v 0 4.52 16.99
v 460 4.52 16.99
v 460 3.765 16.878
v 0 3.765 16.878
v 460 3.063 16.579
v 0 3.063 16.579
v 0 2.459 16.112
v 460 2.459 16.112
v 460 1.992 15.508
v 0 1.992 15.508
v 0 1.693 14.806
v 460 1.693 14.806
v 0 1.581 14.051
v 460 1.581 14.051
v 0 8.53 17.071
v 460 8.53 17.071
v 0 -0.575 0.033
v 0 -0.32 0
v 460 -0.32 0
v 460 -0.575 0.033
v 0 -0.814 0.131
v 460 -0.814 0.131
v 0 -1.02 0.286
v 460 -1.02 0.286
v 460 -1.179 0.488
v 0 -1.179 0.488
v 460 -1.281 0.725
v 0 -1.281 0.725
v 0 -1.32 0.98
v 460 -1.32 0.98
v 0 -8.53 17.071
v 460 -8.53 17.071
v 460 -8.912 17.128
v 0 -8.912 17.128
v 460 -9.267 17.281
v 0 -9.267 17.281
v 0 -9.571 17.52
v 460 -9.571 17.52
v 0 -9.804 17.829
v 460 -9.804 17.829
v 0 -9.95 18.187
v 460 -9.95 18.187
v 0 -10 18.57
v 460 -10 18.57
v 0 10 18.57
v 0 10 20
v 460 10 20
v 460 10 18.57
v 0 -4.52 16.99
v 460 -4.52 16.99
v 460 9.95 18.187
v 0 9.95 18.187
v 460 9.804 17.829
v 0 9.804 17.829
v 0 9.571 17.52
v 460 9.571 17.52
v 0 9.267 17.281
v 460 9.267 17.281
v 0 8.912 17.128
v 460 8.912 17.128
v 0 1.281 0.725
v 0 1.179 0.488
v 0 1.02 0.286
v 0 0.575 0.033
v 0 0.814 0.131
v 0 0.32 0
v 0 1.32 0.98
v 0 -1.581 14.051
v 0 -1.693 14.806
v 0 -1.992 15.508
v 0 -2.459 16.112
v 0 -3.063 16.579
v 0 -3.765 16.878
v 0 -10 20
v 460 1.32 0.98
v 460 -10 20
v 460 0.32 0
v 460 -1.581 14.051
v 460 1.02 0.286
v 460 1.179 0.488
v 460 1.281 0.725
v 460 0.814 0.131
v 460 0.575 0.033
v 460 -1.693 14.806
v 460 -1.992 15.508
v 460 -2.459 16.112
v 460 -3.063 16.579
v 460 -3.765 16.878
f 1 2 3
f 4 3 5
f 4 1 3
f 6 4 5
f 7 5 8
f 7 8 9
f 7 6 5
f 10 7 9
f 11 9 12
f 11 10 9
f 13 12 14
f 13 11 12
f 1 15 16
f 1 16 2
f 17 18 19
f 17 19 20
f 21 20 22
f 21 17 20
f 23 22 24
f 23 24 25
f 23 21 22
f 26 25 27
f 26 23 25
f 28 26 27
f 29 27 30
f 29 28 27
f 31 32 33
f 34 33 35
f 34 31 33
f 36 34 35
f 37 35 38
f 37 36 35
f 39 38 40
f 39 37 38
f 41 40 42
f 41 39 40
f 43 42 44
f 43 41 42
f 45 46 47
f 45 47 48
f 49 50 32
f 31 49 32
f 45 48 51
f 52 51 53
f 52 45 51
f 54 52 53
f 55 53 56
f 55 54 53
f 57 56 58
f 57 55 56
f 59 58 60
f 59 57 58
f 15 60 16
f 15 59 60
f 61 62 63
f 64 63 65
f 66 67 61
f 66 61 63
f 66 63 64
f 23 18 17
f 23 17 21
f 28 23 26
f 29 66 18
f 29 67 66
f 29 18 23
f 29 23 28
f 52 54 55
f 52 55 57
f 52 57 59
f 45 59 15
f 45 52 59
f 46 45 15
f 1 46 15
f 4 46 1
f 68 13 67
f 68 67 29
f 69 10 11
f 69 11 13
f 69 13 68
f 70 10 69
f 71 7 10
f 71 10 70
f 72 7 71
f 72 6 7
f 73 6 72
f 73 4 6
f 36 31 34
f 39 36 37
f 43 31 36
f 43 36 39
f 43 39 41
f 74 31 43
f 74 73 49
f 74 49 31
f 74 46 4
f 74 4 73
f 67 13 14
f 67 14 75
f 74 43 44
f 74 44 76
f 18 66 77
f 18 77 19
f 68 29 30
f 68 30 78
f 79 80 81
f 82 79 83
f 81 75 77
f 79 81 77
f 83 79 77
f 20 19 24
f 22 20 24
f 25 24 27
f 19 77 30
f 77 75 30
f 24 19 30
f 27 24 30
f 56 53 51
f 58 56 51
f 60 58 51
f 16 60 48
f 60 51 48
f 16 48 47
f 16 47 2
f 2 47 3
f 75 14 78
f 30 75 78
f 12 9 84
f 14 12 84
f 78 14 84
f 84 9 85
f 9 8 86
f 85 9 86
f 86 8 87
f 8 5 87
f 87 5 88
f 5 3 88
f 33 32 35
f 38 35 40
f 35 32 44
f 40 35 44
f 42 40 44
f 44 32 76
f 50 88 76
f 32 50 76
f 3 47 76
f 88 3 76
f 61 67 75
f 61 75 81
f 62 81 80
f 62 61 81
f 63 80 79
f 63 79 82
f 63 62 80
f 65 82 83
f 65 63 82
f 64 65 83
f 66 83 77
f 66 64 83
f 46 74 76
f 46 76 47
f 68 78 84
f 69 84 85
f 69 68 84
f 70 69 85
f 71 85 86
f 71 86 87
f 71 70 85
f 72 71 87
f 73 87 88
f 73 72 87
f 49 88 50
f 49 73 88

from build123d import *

# Parameters (mm, degrees)
T_SECTION_T_20_X_20_1_DEPTH = 460


with BuildPart() as part:
    # Sketch12 → T section T 20 X 20(1) (new body)
    with BuildSketch(Plane.YZ):
        with BuildLine():
            Line((-10, 20), (10, 20))
            Line((10, 20), (10, 18.570314587))
            ThreePointArc((10, 18.570314587), (9.571214338, 17.520314662), (8.530000209, 17.070614622))
            Line((8.530000209, 17.070614622), (4.520436432, 16.990406743))
            ThreePointArc((4.520436432, 16.990406743), (2.459116507, 16.112327155), (1.581036919, 14.05100723))
            Line((1.581036919, 14.05100723), (1.319562646, 0.97999986))
            ThreePointArc((1.319562646, 0.97999986), (1.019762619, 0.285857108), (0.319762669, 0))
            Line((0.319762669, 0), (-0.319762669, 0))
            ThreePointArc((-0.319762669, 0), (-1.019762619, 0.285857108), (-1.319562646, 0.97999986))
            Line((-1.319562646, 0.97999986), (-1.581036919, 14.05100723))
            ThreePointArc((-1.581036919, 14.05100723), (-2.459116507, 16.112327155), (-4.520436432, 16.990406743))
            Line((-4.520436432, 16.990406743), (-8.530000209, 17.070614622))
            ThreePointArc((-8.530000209, 17.070614622), (-9.571214338, 17.520314662), (-10, 18.570314587))
            Line((-10, 18.570314587), (-10, 20))
        make_face()
    extrude(amount=T_SECTION_T_20_X_20_1_DEPTH)


solid = part.part
